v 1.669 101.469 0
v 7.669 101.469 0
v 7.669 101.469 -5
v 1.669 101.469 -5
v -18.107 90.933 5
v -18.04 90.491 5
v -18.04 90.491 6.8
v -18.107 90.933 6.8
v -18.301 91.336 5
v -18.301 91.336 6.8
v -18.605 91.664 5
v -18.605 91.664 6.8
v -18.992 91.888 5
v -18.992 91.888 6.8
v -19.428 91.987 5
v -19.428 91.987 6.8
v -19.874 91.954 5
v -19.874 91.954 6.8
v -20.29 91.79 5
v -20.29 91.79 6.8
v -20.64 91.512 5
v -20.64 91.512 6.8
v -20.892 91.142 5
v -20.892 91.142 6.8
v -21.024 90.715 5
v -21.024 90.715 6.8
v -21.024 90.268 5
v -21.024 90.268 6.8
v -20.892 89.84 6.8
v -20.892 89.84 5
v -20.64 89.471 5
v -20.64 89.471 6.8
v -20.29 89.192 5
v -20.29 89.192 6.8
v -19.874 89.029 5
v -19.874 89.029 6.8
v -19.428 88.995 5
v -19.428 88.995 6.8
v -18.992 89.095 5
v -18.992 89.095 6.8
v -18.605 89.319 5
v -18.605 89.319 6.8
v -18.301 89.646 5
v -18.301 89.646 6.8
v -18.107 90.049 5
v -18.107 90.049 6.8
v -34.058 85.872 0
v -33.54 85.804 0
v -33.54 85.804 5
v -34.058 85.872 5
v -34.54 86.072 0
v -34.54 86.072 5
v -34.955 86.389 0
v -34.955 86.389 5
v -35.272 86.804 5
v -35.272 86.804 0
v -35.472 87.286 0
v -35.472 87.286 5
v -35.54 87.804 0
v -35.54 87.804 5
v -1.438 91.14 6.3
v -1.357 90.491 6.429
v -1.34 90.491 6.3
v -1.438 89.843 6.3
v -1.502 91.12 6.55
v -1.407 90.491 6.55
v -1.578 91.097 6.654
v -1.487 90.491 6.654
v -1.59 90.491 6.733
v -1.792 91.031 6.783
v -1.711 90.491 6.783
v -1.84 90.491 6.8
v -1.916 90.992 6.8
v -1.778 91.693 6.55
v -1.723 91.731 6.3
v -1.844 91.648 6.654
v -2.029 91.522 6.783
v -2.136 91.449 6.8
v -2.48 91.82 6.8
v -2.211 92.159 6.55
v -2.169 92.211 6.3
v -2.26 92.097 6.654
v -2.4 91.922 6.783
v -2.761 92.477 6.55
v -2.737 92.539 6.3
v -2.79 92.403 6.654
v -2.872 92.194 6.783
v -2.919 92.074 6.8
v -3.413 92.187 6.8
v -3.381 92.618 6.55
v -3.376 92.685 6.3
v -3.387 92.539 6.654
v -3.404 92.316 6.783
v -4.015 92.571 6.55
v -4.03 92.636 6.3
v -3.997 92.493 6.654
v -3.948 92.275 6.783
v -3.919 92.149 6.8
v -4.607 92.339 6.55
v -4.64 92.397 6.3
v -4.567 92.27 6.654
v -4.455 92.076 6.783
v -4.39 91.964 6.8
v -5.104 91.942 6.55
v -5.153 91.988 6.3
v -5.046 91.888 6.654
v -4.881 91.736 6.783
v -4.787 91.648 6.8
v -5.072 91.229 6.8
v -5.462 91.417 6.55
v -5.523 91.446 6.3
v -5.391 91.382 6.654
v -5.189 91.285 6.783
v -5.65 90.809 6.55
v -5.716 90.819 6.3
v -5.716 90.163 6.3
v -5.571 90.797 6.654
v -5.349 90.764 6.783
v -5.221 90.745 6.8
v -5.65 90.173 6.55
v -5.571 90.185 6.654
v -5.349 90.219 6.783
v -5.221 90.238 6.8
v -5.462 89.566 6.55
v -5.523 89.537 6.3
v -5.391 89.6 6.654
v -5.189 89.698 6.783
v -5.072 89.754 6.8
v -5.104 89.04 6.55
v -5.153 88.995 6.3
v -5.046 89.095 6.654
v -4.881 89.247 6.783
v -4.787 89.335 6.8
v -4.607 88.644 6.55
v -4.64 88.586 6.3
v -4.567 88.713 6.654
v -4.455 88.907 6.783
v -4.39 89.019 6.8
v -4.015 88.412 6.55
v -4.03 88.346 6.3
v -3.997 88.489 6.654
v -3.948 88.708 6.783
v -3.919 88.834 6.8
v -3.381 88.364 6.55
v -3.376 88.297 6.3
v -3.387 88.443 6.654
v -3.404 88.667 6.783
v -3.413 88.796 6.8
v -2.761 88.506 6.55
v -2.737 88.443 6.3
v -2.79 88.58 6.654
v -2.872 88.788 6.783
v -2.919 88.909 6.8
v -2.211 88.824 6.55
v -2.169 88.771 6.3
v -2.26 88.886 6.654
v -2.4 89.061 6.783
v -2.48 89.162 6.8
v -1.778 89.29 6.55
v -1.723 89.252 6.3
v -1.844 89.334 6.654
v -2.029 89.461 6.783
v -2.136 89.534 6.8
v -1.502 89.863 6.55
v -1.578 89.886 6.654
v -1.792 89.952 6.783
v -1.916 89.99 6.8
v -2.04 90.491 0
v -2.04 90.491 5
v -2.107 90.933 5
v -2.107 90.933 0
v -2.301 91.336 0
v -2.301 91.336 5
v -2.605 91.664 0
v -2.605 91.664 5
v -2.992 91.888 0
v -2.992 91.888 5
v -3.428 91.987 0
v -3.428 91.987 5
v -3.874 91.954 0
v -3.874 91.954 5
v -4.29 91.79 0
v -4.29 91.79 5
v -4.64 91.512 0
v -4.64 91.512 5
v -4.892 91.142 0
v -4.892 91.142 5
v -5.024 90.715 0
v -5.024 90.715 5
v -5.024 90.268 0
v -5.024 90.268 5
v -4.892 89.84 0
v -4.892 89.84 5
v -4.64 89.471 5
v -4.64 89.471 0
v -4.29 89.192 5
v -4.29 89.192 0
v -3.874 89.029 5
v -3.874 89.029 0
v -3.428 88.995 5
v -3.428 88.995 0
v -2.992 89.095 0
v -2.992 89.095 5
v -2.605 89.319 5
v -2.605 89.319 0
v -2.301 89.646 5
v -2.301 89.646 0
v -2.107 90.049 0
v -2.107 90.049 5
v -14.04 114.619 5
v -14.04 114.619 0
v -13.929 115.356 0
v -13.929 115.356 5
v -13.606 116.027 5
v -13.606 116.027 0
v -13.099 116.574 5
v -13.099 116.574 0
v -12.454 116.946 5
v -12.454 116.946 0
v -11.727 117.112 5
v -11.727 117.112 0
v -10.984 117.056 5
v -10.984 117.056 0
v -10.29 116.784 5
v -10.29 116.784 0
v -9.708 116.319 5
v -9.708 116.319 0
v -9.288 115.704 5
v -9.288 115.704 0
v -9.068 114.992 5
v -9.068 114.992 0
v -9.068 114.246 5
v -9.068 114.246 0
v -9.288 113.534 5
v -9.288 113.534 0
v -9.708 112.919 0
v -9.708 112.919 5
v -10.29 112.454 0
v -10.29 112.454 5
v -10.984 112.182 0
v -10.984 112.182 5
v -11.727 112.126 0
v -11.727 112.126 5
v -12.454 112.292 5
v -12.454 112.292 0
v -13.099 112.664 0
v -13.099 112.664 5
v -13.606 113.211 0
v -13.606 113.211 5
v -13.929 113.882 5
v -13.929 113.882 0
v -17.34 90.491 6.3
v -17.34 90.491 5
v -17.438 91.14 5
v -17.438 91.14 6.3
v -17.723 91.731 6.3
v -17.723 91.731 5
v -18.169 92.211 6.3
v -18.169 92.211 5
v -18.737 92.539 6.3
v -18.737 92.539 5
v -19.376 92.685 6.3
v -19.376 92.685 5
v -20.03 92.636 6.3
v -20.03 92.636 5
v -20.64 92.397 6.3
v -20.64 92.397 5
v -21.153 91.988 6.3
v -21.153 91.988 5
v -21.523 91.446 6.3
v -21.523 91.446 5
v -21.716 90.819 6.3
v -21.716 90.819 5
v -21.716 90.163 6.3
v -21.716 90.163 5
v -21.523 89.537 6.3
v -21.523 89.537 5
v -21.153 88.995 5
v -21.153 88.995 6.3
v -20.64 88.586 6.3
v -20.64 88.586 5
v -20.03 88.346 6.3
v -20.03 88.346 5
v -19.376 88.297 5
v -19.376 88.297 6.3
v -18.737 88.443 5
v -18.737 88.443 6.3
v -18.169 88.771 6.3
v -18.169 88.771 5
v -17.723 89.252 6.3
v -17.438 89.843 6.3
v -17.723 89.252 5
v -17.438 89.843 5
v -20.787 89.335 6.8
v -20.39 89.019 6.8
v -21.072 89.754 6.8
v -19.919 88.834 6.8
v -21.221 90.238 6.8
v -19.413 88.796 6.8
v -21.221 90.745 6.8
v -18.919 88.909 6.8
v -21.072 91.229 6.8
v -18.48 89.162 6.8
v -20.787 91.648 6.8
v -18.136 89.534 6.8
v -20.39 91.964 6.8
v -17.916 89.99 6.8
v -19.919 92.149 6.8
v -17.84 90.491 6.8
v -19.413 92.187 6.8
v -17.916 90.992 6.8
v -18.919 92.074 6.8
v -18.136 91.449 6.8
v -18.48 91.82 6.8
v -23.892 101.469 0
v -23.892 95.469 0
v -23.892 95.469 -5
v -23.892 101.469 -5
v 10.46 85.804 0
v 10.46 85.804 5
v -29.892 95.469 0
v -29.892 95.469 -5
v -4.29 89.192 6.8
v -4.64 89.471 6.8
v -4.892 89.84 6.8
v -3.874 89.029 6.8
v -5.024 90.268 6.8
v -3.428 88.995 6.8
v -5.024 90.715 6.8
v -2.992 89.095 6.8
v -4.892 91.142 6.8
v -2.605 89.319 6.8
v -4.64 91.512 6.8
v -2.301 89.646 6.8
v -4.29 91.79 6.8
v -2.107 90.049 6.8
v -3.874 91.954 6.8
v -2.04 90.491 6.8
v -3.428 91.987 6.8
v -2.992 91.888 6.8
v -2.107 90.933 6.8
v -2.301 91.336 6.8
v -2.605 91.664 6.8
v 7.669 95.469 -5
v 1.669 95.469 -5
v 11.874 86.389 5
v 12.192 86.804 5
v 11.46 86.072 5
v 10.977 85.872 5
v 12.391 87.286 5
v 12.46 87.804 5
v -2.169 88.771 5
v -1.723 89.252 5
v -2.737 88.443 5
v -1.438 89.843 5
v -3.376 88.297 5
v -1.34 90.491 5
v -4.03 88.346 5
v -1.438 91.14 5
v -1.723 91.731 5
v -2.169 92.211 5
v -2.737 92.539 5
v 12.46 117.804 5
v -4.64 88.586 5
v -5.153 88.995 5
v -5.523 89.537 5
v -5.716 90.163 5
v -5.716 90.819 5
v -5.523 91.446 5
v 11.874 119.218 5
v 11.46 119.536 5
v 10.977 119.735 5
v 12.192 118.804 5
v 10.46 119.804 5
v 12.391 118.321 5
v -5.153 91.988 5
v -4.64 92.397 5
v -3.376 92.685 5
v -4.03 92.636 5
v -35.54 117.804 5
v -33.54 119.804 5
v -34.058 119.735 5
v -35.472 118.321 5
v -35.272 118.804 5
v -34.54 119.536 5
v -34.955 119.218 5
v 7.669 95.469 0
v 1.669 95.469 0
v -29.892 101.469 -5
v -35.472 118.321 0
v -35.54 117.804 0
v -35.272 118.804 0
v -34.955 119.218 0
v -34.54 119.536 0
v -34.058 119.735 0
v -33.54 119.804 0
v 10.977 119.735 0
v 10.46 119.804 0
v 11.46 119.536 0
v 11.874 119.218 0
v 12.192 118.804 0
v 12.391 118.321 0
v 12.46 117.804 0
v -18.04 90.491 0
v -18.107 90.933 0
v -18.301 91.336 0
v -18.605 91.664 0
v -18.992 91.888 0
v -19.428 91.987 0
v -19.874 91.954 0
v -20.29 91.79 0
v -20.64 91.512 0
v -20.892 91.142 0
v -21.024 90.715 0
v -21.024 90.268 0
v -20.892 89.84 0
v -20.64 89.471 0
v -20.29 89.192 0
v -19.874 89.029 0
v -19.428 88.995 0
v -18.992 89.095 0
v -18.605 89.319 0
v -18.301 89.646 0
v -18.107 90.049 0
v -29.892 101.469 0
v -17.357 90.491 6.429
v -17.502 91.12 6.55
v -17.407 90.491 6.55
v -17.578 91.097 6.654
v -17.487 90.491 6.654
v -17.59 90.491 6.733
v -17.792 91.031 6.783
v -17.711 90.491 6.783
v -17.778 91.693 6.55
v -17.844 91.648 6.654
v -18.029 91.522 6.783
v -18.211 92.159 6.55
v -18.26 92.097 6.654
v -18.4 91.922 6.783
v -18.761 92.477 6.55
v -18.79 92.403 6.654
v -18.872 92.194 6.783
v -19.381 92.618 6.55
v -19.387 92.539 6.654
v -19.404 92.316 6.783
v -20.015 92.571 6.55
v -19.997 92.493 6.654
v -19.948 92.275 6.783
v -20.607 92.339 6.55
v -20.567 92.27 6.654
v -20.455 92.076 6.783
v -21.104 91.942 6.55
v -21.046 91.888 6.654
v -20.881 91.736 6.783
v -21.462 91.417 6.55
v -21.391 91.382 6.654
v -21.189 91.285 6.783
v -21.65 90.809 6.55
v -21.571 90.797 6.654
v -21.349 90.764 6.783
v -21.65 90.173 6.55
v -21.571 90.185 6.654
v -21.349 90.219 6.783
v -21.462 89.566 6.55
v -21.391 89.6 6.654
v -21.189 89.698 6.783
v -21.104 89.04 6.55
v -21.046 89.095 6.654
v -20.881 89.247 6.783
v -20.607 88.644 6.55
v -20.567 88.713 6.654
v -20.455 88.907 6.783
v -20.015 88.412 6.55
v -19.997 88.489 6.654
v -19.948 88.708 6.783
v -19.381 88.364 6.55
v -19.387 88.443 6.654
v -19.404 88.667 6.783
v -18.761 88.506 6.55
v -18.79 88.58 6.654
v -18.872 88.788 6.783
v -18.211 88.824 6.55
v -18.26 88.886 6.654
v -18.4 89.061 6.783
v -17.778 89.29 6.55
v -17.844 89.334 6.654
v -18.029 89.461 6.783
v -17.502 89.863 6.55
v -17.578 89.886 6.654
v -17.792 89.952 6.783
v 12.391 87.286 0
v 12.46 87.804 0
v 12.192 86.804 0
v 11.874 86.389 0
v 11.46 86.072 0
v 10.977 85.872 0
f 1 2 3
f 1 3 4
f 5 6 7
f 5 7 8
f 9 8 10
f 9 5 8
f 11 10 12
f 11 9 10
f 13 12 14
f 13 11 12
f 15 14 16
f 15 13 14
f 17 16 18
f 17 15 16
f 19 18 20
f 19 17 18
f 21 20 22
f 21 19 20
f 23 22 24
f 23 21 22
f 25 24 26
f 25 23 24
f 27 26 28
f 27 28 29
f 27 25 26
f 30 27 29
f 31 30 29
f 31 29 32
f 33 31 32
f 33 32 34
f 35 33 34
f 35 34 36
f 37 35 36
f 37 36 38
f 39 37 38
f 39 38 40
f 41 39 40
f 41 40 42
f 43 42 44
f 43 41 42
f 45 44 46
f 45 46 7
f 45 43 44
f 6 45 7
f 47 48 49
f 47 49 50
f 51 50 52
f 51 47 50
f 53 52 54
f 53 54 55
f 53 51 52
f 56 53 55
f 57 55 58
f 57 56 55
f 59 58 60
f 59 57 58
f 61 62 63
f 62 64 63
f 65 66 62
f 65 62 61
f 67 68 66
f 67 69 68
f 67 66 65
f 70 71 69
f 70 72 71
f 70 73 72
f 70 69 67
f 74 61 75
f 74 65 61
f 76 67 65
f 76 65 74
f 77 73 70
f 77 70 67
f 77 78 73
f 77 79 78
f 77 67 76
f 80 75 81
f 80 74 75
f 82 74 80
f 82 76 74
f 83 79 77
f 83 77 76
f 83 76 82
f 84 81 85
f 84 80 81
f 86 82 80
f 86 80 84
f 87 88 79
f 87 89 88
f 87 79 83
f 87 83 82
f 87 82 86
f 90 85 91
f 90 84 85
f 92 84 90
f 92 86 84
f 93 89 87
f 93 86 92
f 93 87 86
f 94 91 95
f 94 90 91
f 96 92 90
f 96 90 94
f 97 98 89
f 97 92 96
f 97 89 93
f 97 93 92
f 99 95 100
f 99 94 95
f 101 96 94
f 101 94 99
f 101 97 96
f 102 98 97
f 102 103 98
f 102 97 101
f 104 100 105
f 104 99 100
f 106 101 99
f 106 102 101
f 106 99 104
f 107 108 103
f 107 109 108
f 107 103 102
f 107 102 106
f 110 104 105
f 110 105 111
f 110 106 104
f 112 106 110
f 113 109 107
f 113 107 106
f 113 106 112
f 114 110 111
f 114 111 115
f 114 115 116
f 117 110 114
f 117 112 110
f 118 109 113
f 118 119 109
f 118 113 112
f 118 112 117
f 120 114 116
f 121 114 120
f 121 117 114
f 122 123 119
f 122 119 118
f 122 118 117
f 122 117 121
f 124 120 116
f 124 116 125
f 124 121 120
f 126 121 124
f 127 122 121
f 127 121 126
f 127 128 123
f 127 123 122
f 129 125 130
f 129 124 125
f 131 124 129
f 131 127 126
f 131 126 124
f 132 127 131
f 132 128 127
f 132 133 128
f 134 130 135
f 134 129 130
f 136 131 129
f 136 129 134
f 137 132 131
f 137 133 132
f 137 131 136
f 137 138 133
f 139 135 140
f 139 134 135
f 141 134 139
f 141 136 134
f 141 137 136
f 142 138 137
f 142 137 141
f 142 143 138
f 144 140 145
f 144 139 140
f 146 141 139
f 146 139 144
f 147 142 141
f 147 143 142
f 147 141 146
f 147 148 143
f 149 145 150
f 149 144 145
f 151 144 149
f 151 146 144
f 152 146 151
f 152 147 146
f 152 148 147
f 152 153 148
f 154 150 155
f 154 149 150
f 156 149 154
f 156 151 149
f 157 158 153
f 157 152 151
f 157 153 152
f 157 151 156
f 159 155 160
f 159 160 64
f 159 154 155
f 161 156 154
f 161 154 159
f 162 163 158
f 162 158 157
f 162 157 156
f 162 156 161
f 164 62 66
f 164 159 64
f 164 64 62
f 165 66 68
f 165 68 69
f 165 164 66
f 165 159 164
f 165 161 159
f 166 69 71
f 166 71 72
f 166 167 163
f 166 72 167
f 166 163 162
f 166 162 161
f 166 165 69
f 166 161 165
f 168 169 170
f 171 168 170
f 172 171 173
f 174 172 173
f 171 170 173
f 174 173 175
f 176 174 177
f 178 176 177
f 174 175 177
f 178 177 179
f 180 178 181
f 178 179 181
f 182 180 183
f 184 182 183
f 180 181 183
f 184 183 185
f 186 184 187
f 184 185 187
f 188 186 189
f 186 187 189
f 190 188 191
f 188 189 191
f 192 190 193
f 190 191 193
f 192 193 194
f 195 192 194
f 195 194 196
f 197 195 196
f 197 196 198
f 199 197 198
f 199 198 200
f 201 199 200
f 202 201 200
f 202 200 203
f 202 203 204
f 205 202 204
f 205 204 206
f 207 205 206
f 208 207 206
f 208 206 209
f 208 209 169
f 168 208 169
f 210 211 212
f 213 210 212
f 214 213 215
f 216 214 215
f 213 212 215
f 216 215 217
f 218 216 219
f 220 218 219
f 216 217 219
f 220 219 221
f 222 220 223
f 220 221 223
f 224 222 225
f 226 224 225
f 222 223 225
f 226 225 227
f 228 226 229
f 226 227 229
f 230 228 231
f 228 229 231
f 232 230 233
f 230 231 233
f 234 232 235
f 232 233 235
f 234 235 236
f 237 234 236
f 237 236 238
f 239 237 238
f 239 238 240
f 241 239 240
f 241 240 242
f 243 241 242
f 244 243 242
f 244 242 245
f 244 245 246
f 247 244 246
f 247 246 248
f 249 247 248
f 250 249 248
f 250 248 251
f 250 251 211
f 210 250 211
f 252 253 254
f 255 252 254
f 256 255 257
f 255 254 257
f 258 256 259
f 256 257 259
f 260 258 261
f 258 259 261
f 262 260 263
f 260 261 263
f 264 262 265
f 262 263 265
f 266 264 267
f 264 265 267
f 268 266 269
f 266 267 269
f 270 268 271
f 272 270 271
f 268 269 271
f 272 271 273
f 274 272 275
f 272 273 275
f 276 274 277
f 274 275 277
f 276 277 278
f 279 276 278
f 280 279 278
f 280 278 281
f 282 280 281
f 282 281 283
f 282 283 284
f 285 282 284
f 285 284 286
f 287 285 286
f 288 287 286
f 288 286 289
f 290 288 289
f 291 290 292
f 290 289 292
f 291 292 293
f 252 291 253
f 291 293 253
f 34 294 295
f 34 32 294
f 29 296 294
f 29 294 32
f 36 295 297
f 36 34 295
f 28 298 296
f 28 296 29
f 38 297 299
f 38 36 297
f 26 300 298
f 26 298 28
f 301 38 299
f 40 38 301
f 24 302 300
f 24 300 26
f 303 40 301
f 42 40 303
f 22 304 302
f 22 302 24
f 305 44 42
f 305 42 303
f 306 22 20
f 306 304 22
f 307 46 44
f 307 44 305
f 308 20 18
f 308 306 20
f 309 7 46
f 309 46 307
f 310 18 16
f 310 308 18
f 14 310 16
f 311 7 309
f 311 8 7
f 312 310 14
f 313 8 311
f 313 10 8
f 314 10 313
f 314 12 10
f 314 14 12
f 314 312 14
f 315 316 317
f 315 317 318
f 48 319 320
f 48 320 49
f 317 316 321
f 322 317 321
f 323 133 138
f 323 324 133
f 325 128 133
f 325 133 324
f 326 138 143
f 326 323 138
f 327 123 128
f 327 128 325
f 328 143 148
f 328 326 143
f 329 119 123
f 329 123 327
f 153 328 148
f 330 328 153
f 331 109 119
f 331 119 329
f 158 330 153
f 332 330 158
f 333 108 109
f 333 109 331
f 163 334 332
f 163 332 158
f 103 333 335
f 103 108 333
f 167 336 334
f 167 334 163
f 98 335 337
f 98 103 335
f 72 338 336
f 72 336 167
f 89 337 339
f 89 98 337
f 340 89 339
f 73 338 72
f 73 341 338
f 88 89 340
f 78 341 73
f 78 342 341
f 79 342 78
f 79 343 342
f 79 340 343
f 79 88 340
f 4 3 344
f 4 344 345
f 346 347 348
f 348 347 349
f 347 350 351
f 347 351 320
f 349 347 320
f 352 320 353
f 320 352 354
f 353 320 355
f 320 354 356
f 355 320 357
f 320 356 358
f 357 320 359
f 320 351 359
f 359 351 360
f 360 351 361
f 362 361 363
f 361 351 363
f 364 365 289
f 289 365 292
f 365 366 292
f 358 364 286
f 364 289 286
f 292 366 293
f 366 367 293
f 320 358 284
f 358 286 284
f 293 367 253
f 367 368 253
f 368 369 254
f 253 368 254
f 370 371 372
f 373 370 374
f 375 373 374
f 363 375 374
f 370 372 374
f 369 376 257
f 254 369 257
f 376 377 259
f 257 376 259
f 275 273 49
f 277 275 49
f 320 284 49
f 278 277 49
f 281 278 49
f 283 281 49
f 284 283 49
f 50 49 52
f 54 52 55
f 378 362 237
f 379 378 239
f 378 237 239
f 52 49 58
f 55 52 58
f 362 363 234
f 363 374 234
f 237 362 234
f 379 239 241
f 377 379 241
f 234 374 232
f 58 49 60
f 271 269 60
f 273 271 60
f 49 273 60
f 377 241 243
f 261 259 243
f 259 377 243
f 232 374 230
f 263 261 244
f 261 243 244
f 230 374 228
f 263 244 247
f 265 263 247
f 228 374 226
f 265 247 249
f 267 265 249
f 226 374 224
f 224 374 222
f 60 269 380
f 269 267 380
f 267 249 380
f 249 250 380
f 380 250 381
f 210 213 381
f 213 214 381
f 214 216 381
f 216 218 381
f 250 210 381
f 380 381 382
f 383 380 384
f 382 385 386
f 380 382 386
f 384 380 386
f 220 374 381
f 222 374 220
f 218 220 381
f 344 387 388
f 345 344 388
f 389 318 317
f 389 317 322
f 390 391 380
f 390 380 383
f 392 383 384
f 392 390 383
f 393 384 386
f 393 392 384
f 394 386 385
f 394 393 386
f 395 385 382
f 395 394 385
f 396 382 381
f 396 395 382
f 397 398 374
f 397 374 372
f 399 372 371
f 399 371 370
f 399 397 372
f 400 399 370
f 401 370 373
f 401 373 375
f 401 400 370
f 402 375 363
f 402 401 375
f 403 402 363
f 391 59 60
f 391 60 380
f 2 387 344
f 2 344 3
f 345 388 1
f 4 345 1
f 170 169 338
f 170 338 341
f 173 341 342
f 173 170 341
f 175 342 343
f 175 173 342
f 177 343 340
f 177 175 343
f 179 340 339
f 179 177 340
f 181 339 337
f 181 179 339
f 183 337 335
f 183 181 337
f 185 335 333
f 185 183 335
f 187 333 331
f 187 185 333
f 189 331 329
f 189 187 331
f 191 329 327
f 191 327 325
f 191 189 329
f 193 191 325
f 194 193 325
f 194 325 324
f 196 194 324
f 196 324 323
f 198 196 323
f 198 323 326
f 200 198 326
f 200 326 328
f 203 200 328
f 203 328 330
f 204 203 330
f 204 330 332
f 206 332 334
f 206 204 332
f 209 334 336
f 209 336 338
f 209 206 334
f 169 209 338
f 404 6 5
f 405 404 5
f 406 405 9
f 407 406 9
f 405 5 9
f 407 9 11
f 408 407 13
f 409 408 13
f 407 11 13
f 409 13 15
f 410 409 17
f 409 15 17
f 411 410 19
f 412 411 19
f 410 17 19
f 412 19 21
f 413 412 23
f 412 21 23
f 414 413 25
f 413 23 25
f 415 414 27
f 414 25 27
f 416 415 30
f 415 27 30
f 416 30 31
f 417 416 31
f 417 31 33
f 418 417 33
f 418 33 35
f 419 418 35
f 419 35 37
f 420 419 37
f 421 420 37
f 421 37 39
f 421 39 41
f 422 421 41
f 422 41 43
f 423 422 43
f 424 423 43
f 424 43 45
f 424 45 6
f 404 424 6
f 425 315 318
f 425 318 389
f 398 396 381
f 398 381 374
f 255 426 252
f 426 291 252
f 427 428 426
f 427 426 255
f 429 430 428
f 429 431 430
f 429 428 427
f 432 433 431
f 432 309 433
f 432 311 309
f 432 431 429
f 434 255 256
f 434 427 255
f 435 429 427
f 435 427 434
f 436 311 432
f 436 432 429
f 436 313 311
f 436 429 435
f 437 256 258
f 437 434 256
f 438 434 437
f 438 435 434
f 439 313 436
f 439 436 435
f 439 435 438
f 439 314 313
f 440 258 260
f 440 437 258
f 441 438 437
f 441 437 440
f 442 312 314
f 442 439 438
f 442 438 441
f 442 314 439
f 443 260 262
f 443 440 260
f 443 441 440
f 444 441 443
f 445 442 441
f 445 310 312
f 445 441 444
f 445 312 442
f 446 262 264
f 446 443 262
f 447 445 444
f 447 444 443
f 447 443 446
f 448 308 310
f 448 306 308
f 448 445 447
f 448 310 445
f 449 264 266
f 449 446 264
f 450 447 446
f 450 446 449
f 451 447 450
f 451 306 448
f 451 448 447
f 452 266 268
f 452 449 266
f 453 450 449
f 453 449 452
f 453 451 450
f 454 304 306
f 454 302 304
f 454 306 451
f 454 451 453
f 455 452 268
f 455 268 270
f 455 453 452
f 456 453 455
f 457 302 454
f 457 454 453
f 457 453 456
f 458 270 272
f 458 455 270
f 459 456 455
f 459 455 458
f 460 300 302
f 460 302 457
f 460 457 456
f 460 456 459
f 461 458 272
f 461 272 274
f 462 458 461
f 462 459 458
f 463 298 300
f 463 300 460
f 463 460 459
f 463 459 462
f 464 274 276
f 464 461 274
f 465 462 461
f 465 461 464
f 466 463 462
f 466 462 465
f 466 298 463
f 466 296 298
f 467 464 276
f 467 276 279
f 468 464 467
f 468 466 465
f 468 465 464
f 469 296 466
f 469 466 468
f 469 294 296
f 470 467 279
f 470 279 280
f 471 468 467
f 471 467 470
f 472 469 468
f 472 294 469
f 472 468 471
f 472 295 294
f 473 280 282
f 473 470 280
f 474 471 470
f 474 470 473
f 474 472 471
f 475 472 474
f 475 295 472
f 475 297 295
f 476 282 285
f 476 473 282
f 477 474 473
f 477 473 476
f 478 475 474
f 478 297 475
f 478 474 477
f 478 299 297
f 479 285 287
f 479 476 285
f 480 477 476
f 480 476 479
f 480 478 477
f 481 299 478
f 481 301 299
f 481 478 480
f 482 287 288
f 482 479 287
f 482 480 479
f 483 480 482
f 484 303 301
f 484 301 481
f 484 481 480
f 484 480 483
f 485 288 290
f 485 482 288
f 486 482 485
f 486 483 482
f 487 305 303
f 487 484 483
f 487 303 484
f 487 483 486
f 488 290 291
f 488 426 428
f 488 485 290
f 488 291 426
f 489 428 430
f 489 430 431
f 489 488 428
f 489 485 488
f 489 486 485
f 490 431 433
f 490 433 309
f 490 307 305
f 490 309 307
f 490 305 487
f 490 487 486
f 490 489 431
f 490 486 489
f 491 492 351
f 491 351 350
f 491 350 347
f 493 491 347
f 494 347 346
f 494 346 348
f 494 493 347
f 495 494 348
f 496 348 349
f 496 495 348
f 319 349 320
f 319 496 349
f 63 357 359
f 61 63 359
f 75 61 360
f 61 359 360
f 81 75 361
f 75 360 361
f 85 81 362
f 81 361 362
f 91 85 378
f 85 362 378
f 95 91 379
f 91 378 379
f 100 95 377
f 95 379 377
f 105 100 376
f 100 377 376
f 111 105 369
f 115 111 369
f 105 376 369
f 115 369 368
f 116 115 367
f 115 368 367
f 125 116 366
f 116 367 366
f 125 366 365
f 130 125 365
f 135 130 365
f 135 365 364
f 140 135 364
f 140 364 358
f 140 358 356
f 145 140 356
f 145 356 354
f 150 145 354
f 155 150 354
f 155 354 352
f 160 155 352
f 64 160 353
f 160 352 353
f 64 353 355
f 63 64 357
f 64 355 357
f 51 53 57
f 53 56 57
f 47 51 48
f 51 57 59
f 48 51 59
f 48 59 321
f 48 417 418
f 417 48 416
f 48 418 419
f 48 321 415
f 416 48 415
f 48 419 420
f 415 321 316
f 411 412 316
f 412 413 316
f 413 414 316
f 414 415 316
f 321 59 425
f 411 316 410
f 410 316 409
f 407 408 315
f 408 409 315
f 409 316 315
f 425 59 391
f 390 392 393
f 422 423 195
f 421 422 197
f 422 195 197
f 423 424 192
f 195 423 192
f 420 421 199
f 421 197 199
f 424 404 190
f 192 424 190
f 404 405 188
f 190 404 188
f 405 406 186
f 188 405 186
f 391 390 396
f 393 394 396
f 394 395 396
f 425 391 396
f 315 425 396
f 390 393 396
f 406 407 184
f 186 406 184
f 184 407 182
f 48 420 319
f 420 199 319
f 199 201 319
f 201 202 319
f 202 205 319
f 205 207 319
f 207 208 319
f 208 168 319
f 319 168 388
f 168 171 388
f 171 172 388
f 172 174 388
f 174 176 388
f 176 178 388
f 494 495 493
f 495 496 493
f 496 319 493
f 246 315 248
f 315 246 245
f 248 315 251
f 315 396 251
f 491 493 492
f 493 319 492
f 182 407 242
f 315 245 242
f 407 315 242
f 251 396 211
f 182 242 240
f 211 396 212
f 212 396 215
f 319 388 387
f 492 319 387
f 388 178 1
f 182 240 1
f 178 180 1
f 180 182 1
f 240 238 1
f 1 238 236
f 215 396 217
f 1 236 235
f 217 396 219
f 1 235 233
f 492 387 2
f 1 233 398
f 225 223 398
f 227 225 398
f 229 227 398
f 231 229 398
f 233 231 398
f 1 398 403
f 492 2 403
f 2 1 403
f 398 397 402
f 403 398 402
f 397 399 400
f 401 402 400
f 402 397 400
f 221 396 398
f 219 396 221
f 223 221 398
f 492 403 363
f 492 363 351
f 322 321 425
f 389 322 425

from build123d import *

# Parameters (mm, degrees)
BOSS_EXTRUDE5_DEPTH       = 5
SKETCH9_R                 = 2.2
SKETCH9_R_2               = 1.5
BOSS_EXTRUDE11_DEPTH      = 1.8
BOSS_EXTRUDE11_DEPTH_BACK = 5
SKETCH9_10_R              = 1.5
CUT_EXTRUDE4_DEPTH        = 6
SKETCH11_R                = 2.5
CUT_EXTRUDE5_DEPTH        = 7.8
SKETCH12_W                = 6
SKETCH12_H                = 6
BOSS_EXTRUDE12_DEPTH      = 5
FILLET7_R                 = 0.5


with BuildPart() as part:
    # Sketch8 → Boss-Extrude5 (new body)
    with BuildSketch(Plane.XY):
        with BuildLine():
            Line((-33.540427797, 119.803578872), (10.459572203, 119.803578872))
            ThreePointArc((10.459572203, 119.803578872), (11.873785765, 119.217792435), (12.459572203, 117.803578872))
            Line((12.459572203, 117.803578872), (12.459572203, 87.803578872))
            ThreePointArc((12.459572203, 87.803578872), (11.873785765, 86.38936531), (10.459572203, 85.803578872))
            Line((10.459572203, 85.803578872), (-33.540427797, 85.803578872))
            ThreePointArc((-33.540427797, 85.803578872), (-34.95464136, 86.38936531), (-35.540427797, 87.803578872))
            Line((-35.540427797, 87.803578872), (-35.540427797, 117.803578872))
            ThreePointArc((-35.540427797, 117.803578872), (-34.95464136, 119.217792435), (-33.540427797, 119.803578872))
        make_face()
    extrude(amount=BOSS_EXTRUDE5_DEPTH)

    # Sketch9 → Boss-Extrude11 (add, two sides)
    with BuildSketch(Plane.XY.offset(5)) as boss_extrude11_sk:
        with Locations((-3.540427797, 90.491289859)):
            Circle(SKETCH9_R)
        with Locations((-3.540427797, 90.491289859)):
            Circle(SKETCH9_R_2, mode=Mode.SUBTRACT)
        with Locations((-19.540427797, 90.491289859)):
            Circle(SKETCH9_R)
        with Locations((-19.540427797, 90.491289859)):
            Circle(SKETCH9_R_2, mode=Mode.SUBTRACT)
    extrude(amount=BOSS_EXTRUDE11_DEPTH)
    extrude(boss_extrude11_sk.sketch, amount=-BOSS_EXTRUDE11_DEPTH_BACK)

    # Sketch9<10> → Cut-Extrude4 (cut, through all)
    with BuildSketch(Plane.XY.offset(5)):
        with Locations((-3.540427797, 90.491289859)):
            Circle(SKETCH9_10_R)
        with Locations((-19.540427797, 90.491289859)):
            Circle(SKETCH9_10_R)
    extrude(amount=-CUT_EXTRUDE4_DEPTH, mode=Mode.SUBTRACT)

    # Sketch11 → Cut-Extrude5 (cut, through all)
    with BuildSketch(Plane(origin=(0, 0, 0), x_dir=(-1, 0, 0), z_dir=(0, 0, -1))):
        with Locations((11.540427797, 114.618963942)):
            Circle(SKETCH11_R)
    extrude(amount=-CUT_EXTRUDE5_DEPTH, mode=Mode.SUBTRACT)

    # Sketch12 → Boss-Extrude12 (add)
    with BuildSketch(Plane(origin=(0, 0, 0), x_dir=(-1, 0, 0), z_dir=(0, 0, -1))):
        with Locations((-4.669308543, 98.468963942)):
            Rectangle(SKETCH12_W, SKETCH12_H)
        with Locations((26.892367502, 98.468963942)):
            Rectangle(SKETCH12_W, SKETCH12_H)
    extrude(amount=BOSS_EXTRUDE12_DEPTH)

    # Fillet7
    fillet7_edges = [part.edges().sort_by_distance(p)[0] for p in [
        (-21.740427797, 90.491289859, 6.8),
        (-5.740427797, 90.491289859, 6.8),
    ]]
    fillet(fillet7_edges, radius=FILLET7_R)


solid = part.part
